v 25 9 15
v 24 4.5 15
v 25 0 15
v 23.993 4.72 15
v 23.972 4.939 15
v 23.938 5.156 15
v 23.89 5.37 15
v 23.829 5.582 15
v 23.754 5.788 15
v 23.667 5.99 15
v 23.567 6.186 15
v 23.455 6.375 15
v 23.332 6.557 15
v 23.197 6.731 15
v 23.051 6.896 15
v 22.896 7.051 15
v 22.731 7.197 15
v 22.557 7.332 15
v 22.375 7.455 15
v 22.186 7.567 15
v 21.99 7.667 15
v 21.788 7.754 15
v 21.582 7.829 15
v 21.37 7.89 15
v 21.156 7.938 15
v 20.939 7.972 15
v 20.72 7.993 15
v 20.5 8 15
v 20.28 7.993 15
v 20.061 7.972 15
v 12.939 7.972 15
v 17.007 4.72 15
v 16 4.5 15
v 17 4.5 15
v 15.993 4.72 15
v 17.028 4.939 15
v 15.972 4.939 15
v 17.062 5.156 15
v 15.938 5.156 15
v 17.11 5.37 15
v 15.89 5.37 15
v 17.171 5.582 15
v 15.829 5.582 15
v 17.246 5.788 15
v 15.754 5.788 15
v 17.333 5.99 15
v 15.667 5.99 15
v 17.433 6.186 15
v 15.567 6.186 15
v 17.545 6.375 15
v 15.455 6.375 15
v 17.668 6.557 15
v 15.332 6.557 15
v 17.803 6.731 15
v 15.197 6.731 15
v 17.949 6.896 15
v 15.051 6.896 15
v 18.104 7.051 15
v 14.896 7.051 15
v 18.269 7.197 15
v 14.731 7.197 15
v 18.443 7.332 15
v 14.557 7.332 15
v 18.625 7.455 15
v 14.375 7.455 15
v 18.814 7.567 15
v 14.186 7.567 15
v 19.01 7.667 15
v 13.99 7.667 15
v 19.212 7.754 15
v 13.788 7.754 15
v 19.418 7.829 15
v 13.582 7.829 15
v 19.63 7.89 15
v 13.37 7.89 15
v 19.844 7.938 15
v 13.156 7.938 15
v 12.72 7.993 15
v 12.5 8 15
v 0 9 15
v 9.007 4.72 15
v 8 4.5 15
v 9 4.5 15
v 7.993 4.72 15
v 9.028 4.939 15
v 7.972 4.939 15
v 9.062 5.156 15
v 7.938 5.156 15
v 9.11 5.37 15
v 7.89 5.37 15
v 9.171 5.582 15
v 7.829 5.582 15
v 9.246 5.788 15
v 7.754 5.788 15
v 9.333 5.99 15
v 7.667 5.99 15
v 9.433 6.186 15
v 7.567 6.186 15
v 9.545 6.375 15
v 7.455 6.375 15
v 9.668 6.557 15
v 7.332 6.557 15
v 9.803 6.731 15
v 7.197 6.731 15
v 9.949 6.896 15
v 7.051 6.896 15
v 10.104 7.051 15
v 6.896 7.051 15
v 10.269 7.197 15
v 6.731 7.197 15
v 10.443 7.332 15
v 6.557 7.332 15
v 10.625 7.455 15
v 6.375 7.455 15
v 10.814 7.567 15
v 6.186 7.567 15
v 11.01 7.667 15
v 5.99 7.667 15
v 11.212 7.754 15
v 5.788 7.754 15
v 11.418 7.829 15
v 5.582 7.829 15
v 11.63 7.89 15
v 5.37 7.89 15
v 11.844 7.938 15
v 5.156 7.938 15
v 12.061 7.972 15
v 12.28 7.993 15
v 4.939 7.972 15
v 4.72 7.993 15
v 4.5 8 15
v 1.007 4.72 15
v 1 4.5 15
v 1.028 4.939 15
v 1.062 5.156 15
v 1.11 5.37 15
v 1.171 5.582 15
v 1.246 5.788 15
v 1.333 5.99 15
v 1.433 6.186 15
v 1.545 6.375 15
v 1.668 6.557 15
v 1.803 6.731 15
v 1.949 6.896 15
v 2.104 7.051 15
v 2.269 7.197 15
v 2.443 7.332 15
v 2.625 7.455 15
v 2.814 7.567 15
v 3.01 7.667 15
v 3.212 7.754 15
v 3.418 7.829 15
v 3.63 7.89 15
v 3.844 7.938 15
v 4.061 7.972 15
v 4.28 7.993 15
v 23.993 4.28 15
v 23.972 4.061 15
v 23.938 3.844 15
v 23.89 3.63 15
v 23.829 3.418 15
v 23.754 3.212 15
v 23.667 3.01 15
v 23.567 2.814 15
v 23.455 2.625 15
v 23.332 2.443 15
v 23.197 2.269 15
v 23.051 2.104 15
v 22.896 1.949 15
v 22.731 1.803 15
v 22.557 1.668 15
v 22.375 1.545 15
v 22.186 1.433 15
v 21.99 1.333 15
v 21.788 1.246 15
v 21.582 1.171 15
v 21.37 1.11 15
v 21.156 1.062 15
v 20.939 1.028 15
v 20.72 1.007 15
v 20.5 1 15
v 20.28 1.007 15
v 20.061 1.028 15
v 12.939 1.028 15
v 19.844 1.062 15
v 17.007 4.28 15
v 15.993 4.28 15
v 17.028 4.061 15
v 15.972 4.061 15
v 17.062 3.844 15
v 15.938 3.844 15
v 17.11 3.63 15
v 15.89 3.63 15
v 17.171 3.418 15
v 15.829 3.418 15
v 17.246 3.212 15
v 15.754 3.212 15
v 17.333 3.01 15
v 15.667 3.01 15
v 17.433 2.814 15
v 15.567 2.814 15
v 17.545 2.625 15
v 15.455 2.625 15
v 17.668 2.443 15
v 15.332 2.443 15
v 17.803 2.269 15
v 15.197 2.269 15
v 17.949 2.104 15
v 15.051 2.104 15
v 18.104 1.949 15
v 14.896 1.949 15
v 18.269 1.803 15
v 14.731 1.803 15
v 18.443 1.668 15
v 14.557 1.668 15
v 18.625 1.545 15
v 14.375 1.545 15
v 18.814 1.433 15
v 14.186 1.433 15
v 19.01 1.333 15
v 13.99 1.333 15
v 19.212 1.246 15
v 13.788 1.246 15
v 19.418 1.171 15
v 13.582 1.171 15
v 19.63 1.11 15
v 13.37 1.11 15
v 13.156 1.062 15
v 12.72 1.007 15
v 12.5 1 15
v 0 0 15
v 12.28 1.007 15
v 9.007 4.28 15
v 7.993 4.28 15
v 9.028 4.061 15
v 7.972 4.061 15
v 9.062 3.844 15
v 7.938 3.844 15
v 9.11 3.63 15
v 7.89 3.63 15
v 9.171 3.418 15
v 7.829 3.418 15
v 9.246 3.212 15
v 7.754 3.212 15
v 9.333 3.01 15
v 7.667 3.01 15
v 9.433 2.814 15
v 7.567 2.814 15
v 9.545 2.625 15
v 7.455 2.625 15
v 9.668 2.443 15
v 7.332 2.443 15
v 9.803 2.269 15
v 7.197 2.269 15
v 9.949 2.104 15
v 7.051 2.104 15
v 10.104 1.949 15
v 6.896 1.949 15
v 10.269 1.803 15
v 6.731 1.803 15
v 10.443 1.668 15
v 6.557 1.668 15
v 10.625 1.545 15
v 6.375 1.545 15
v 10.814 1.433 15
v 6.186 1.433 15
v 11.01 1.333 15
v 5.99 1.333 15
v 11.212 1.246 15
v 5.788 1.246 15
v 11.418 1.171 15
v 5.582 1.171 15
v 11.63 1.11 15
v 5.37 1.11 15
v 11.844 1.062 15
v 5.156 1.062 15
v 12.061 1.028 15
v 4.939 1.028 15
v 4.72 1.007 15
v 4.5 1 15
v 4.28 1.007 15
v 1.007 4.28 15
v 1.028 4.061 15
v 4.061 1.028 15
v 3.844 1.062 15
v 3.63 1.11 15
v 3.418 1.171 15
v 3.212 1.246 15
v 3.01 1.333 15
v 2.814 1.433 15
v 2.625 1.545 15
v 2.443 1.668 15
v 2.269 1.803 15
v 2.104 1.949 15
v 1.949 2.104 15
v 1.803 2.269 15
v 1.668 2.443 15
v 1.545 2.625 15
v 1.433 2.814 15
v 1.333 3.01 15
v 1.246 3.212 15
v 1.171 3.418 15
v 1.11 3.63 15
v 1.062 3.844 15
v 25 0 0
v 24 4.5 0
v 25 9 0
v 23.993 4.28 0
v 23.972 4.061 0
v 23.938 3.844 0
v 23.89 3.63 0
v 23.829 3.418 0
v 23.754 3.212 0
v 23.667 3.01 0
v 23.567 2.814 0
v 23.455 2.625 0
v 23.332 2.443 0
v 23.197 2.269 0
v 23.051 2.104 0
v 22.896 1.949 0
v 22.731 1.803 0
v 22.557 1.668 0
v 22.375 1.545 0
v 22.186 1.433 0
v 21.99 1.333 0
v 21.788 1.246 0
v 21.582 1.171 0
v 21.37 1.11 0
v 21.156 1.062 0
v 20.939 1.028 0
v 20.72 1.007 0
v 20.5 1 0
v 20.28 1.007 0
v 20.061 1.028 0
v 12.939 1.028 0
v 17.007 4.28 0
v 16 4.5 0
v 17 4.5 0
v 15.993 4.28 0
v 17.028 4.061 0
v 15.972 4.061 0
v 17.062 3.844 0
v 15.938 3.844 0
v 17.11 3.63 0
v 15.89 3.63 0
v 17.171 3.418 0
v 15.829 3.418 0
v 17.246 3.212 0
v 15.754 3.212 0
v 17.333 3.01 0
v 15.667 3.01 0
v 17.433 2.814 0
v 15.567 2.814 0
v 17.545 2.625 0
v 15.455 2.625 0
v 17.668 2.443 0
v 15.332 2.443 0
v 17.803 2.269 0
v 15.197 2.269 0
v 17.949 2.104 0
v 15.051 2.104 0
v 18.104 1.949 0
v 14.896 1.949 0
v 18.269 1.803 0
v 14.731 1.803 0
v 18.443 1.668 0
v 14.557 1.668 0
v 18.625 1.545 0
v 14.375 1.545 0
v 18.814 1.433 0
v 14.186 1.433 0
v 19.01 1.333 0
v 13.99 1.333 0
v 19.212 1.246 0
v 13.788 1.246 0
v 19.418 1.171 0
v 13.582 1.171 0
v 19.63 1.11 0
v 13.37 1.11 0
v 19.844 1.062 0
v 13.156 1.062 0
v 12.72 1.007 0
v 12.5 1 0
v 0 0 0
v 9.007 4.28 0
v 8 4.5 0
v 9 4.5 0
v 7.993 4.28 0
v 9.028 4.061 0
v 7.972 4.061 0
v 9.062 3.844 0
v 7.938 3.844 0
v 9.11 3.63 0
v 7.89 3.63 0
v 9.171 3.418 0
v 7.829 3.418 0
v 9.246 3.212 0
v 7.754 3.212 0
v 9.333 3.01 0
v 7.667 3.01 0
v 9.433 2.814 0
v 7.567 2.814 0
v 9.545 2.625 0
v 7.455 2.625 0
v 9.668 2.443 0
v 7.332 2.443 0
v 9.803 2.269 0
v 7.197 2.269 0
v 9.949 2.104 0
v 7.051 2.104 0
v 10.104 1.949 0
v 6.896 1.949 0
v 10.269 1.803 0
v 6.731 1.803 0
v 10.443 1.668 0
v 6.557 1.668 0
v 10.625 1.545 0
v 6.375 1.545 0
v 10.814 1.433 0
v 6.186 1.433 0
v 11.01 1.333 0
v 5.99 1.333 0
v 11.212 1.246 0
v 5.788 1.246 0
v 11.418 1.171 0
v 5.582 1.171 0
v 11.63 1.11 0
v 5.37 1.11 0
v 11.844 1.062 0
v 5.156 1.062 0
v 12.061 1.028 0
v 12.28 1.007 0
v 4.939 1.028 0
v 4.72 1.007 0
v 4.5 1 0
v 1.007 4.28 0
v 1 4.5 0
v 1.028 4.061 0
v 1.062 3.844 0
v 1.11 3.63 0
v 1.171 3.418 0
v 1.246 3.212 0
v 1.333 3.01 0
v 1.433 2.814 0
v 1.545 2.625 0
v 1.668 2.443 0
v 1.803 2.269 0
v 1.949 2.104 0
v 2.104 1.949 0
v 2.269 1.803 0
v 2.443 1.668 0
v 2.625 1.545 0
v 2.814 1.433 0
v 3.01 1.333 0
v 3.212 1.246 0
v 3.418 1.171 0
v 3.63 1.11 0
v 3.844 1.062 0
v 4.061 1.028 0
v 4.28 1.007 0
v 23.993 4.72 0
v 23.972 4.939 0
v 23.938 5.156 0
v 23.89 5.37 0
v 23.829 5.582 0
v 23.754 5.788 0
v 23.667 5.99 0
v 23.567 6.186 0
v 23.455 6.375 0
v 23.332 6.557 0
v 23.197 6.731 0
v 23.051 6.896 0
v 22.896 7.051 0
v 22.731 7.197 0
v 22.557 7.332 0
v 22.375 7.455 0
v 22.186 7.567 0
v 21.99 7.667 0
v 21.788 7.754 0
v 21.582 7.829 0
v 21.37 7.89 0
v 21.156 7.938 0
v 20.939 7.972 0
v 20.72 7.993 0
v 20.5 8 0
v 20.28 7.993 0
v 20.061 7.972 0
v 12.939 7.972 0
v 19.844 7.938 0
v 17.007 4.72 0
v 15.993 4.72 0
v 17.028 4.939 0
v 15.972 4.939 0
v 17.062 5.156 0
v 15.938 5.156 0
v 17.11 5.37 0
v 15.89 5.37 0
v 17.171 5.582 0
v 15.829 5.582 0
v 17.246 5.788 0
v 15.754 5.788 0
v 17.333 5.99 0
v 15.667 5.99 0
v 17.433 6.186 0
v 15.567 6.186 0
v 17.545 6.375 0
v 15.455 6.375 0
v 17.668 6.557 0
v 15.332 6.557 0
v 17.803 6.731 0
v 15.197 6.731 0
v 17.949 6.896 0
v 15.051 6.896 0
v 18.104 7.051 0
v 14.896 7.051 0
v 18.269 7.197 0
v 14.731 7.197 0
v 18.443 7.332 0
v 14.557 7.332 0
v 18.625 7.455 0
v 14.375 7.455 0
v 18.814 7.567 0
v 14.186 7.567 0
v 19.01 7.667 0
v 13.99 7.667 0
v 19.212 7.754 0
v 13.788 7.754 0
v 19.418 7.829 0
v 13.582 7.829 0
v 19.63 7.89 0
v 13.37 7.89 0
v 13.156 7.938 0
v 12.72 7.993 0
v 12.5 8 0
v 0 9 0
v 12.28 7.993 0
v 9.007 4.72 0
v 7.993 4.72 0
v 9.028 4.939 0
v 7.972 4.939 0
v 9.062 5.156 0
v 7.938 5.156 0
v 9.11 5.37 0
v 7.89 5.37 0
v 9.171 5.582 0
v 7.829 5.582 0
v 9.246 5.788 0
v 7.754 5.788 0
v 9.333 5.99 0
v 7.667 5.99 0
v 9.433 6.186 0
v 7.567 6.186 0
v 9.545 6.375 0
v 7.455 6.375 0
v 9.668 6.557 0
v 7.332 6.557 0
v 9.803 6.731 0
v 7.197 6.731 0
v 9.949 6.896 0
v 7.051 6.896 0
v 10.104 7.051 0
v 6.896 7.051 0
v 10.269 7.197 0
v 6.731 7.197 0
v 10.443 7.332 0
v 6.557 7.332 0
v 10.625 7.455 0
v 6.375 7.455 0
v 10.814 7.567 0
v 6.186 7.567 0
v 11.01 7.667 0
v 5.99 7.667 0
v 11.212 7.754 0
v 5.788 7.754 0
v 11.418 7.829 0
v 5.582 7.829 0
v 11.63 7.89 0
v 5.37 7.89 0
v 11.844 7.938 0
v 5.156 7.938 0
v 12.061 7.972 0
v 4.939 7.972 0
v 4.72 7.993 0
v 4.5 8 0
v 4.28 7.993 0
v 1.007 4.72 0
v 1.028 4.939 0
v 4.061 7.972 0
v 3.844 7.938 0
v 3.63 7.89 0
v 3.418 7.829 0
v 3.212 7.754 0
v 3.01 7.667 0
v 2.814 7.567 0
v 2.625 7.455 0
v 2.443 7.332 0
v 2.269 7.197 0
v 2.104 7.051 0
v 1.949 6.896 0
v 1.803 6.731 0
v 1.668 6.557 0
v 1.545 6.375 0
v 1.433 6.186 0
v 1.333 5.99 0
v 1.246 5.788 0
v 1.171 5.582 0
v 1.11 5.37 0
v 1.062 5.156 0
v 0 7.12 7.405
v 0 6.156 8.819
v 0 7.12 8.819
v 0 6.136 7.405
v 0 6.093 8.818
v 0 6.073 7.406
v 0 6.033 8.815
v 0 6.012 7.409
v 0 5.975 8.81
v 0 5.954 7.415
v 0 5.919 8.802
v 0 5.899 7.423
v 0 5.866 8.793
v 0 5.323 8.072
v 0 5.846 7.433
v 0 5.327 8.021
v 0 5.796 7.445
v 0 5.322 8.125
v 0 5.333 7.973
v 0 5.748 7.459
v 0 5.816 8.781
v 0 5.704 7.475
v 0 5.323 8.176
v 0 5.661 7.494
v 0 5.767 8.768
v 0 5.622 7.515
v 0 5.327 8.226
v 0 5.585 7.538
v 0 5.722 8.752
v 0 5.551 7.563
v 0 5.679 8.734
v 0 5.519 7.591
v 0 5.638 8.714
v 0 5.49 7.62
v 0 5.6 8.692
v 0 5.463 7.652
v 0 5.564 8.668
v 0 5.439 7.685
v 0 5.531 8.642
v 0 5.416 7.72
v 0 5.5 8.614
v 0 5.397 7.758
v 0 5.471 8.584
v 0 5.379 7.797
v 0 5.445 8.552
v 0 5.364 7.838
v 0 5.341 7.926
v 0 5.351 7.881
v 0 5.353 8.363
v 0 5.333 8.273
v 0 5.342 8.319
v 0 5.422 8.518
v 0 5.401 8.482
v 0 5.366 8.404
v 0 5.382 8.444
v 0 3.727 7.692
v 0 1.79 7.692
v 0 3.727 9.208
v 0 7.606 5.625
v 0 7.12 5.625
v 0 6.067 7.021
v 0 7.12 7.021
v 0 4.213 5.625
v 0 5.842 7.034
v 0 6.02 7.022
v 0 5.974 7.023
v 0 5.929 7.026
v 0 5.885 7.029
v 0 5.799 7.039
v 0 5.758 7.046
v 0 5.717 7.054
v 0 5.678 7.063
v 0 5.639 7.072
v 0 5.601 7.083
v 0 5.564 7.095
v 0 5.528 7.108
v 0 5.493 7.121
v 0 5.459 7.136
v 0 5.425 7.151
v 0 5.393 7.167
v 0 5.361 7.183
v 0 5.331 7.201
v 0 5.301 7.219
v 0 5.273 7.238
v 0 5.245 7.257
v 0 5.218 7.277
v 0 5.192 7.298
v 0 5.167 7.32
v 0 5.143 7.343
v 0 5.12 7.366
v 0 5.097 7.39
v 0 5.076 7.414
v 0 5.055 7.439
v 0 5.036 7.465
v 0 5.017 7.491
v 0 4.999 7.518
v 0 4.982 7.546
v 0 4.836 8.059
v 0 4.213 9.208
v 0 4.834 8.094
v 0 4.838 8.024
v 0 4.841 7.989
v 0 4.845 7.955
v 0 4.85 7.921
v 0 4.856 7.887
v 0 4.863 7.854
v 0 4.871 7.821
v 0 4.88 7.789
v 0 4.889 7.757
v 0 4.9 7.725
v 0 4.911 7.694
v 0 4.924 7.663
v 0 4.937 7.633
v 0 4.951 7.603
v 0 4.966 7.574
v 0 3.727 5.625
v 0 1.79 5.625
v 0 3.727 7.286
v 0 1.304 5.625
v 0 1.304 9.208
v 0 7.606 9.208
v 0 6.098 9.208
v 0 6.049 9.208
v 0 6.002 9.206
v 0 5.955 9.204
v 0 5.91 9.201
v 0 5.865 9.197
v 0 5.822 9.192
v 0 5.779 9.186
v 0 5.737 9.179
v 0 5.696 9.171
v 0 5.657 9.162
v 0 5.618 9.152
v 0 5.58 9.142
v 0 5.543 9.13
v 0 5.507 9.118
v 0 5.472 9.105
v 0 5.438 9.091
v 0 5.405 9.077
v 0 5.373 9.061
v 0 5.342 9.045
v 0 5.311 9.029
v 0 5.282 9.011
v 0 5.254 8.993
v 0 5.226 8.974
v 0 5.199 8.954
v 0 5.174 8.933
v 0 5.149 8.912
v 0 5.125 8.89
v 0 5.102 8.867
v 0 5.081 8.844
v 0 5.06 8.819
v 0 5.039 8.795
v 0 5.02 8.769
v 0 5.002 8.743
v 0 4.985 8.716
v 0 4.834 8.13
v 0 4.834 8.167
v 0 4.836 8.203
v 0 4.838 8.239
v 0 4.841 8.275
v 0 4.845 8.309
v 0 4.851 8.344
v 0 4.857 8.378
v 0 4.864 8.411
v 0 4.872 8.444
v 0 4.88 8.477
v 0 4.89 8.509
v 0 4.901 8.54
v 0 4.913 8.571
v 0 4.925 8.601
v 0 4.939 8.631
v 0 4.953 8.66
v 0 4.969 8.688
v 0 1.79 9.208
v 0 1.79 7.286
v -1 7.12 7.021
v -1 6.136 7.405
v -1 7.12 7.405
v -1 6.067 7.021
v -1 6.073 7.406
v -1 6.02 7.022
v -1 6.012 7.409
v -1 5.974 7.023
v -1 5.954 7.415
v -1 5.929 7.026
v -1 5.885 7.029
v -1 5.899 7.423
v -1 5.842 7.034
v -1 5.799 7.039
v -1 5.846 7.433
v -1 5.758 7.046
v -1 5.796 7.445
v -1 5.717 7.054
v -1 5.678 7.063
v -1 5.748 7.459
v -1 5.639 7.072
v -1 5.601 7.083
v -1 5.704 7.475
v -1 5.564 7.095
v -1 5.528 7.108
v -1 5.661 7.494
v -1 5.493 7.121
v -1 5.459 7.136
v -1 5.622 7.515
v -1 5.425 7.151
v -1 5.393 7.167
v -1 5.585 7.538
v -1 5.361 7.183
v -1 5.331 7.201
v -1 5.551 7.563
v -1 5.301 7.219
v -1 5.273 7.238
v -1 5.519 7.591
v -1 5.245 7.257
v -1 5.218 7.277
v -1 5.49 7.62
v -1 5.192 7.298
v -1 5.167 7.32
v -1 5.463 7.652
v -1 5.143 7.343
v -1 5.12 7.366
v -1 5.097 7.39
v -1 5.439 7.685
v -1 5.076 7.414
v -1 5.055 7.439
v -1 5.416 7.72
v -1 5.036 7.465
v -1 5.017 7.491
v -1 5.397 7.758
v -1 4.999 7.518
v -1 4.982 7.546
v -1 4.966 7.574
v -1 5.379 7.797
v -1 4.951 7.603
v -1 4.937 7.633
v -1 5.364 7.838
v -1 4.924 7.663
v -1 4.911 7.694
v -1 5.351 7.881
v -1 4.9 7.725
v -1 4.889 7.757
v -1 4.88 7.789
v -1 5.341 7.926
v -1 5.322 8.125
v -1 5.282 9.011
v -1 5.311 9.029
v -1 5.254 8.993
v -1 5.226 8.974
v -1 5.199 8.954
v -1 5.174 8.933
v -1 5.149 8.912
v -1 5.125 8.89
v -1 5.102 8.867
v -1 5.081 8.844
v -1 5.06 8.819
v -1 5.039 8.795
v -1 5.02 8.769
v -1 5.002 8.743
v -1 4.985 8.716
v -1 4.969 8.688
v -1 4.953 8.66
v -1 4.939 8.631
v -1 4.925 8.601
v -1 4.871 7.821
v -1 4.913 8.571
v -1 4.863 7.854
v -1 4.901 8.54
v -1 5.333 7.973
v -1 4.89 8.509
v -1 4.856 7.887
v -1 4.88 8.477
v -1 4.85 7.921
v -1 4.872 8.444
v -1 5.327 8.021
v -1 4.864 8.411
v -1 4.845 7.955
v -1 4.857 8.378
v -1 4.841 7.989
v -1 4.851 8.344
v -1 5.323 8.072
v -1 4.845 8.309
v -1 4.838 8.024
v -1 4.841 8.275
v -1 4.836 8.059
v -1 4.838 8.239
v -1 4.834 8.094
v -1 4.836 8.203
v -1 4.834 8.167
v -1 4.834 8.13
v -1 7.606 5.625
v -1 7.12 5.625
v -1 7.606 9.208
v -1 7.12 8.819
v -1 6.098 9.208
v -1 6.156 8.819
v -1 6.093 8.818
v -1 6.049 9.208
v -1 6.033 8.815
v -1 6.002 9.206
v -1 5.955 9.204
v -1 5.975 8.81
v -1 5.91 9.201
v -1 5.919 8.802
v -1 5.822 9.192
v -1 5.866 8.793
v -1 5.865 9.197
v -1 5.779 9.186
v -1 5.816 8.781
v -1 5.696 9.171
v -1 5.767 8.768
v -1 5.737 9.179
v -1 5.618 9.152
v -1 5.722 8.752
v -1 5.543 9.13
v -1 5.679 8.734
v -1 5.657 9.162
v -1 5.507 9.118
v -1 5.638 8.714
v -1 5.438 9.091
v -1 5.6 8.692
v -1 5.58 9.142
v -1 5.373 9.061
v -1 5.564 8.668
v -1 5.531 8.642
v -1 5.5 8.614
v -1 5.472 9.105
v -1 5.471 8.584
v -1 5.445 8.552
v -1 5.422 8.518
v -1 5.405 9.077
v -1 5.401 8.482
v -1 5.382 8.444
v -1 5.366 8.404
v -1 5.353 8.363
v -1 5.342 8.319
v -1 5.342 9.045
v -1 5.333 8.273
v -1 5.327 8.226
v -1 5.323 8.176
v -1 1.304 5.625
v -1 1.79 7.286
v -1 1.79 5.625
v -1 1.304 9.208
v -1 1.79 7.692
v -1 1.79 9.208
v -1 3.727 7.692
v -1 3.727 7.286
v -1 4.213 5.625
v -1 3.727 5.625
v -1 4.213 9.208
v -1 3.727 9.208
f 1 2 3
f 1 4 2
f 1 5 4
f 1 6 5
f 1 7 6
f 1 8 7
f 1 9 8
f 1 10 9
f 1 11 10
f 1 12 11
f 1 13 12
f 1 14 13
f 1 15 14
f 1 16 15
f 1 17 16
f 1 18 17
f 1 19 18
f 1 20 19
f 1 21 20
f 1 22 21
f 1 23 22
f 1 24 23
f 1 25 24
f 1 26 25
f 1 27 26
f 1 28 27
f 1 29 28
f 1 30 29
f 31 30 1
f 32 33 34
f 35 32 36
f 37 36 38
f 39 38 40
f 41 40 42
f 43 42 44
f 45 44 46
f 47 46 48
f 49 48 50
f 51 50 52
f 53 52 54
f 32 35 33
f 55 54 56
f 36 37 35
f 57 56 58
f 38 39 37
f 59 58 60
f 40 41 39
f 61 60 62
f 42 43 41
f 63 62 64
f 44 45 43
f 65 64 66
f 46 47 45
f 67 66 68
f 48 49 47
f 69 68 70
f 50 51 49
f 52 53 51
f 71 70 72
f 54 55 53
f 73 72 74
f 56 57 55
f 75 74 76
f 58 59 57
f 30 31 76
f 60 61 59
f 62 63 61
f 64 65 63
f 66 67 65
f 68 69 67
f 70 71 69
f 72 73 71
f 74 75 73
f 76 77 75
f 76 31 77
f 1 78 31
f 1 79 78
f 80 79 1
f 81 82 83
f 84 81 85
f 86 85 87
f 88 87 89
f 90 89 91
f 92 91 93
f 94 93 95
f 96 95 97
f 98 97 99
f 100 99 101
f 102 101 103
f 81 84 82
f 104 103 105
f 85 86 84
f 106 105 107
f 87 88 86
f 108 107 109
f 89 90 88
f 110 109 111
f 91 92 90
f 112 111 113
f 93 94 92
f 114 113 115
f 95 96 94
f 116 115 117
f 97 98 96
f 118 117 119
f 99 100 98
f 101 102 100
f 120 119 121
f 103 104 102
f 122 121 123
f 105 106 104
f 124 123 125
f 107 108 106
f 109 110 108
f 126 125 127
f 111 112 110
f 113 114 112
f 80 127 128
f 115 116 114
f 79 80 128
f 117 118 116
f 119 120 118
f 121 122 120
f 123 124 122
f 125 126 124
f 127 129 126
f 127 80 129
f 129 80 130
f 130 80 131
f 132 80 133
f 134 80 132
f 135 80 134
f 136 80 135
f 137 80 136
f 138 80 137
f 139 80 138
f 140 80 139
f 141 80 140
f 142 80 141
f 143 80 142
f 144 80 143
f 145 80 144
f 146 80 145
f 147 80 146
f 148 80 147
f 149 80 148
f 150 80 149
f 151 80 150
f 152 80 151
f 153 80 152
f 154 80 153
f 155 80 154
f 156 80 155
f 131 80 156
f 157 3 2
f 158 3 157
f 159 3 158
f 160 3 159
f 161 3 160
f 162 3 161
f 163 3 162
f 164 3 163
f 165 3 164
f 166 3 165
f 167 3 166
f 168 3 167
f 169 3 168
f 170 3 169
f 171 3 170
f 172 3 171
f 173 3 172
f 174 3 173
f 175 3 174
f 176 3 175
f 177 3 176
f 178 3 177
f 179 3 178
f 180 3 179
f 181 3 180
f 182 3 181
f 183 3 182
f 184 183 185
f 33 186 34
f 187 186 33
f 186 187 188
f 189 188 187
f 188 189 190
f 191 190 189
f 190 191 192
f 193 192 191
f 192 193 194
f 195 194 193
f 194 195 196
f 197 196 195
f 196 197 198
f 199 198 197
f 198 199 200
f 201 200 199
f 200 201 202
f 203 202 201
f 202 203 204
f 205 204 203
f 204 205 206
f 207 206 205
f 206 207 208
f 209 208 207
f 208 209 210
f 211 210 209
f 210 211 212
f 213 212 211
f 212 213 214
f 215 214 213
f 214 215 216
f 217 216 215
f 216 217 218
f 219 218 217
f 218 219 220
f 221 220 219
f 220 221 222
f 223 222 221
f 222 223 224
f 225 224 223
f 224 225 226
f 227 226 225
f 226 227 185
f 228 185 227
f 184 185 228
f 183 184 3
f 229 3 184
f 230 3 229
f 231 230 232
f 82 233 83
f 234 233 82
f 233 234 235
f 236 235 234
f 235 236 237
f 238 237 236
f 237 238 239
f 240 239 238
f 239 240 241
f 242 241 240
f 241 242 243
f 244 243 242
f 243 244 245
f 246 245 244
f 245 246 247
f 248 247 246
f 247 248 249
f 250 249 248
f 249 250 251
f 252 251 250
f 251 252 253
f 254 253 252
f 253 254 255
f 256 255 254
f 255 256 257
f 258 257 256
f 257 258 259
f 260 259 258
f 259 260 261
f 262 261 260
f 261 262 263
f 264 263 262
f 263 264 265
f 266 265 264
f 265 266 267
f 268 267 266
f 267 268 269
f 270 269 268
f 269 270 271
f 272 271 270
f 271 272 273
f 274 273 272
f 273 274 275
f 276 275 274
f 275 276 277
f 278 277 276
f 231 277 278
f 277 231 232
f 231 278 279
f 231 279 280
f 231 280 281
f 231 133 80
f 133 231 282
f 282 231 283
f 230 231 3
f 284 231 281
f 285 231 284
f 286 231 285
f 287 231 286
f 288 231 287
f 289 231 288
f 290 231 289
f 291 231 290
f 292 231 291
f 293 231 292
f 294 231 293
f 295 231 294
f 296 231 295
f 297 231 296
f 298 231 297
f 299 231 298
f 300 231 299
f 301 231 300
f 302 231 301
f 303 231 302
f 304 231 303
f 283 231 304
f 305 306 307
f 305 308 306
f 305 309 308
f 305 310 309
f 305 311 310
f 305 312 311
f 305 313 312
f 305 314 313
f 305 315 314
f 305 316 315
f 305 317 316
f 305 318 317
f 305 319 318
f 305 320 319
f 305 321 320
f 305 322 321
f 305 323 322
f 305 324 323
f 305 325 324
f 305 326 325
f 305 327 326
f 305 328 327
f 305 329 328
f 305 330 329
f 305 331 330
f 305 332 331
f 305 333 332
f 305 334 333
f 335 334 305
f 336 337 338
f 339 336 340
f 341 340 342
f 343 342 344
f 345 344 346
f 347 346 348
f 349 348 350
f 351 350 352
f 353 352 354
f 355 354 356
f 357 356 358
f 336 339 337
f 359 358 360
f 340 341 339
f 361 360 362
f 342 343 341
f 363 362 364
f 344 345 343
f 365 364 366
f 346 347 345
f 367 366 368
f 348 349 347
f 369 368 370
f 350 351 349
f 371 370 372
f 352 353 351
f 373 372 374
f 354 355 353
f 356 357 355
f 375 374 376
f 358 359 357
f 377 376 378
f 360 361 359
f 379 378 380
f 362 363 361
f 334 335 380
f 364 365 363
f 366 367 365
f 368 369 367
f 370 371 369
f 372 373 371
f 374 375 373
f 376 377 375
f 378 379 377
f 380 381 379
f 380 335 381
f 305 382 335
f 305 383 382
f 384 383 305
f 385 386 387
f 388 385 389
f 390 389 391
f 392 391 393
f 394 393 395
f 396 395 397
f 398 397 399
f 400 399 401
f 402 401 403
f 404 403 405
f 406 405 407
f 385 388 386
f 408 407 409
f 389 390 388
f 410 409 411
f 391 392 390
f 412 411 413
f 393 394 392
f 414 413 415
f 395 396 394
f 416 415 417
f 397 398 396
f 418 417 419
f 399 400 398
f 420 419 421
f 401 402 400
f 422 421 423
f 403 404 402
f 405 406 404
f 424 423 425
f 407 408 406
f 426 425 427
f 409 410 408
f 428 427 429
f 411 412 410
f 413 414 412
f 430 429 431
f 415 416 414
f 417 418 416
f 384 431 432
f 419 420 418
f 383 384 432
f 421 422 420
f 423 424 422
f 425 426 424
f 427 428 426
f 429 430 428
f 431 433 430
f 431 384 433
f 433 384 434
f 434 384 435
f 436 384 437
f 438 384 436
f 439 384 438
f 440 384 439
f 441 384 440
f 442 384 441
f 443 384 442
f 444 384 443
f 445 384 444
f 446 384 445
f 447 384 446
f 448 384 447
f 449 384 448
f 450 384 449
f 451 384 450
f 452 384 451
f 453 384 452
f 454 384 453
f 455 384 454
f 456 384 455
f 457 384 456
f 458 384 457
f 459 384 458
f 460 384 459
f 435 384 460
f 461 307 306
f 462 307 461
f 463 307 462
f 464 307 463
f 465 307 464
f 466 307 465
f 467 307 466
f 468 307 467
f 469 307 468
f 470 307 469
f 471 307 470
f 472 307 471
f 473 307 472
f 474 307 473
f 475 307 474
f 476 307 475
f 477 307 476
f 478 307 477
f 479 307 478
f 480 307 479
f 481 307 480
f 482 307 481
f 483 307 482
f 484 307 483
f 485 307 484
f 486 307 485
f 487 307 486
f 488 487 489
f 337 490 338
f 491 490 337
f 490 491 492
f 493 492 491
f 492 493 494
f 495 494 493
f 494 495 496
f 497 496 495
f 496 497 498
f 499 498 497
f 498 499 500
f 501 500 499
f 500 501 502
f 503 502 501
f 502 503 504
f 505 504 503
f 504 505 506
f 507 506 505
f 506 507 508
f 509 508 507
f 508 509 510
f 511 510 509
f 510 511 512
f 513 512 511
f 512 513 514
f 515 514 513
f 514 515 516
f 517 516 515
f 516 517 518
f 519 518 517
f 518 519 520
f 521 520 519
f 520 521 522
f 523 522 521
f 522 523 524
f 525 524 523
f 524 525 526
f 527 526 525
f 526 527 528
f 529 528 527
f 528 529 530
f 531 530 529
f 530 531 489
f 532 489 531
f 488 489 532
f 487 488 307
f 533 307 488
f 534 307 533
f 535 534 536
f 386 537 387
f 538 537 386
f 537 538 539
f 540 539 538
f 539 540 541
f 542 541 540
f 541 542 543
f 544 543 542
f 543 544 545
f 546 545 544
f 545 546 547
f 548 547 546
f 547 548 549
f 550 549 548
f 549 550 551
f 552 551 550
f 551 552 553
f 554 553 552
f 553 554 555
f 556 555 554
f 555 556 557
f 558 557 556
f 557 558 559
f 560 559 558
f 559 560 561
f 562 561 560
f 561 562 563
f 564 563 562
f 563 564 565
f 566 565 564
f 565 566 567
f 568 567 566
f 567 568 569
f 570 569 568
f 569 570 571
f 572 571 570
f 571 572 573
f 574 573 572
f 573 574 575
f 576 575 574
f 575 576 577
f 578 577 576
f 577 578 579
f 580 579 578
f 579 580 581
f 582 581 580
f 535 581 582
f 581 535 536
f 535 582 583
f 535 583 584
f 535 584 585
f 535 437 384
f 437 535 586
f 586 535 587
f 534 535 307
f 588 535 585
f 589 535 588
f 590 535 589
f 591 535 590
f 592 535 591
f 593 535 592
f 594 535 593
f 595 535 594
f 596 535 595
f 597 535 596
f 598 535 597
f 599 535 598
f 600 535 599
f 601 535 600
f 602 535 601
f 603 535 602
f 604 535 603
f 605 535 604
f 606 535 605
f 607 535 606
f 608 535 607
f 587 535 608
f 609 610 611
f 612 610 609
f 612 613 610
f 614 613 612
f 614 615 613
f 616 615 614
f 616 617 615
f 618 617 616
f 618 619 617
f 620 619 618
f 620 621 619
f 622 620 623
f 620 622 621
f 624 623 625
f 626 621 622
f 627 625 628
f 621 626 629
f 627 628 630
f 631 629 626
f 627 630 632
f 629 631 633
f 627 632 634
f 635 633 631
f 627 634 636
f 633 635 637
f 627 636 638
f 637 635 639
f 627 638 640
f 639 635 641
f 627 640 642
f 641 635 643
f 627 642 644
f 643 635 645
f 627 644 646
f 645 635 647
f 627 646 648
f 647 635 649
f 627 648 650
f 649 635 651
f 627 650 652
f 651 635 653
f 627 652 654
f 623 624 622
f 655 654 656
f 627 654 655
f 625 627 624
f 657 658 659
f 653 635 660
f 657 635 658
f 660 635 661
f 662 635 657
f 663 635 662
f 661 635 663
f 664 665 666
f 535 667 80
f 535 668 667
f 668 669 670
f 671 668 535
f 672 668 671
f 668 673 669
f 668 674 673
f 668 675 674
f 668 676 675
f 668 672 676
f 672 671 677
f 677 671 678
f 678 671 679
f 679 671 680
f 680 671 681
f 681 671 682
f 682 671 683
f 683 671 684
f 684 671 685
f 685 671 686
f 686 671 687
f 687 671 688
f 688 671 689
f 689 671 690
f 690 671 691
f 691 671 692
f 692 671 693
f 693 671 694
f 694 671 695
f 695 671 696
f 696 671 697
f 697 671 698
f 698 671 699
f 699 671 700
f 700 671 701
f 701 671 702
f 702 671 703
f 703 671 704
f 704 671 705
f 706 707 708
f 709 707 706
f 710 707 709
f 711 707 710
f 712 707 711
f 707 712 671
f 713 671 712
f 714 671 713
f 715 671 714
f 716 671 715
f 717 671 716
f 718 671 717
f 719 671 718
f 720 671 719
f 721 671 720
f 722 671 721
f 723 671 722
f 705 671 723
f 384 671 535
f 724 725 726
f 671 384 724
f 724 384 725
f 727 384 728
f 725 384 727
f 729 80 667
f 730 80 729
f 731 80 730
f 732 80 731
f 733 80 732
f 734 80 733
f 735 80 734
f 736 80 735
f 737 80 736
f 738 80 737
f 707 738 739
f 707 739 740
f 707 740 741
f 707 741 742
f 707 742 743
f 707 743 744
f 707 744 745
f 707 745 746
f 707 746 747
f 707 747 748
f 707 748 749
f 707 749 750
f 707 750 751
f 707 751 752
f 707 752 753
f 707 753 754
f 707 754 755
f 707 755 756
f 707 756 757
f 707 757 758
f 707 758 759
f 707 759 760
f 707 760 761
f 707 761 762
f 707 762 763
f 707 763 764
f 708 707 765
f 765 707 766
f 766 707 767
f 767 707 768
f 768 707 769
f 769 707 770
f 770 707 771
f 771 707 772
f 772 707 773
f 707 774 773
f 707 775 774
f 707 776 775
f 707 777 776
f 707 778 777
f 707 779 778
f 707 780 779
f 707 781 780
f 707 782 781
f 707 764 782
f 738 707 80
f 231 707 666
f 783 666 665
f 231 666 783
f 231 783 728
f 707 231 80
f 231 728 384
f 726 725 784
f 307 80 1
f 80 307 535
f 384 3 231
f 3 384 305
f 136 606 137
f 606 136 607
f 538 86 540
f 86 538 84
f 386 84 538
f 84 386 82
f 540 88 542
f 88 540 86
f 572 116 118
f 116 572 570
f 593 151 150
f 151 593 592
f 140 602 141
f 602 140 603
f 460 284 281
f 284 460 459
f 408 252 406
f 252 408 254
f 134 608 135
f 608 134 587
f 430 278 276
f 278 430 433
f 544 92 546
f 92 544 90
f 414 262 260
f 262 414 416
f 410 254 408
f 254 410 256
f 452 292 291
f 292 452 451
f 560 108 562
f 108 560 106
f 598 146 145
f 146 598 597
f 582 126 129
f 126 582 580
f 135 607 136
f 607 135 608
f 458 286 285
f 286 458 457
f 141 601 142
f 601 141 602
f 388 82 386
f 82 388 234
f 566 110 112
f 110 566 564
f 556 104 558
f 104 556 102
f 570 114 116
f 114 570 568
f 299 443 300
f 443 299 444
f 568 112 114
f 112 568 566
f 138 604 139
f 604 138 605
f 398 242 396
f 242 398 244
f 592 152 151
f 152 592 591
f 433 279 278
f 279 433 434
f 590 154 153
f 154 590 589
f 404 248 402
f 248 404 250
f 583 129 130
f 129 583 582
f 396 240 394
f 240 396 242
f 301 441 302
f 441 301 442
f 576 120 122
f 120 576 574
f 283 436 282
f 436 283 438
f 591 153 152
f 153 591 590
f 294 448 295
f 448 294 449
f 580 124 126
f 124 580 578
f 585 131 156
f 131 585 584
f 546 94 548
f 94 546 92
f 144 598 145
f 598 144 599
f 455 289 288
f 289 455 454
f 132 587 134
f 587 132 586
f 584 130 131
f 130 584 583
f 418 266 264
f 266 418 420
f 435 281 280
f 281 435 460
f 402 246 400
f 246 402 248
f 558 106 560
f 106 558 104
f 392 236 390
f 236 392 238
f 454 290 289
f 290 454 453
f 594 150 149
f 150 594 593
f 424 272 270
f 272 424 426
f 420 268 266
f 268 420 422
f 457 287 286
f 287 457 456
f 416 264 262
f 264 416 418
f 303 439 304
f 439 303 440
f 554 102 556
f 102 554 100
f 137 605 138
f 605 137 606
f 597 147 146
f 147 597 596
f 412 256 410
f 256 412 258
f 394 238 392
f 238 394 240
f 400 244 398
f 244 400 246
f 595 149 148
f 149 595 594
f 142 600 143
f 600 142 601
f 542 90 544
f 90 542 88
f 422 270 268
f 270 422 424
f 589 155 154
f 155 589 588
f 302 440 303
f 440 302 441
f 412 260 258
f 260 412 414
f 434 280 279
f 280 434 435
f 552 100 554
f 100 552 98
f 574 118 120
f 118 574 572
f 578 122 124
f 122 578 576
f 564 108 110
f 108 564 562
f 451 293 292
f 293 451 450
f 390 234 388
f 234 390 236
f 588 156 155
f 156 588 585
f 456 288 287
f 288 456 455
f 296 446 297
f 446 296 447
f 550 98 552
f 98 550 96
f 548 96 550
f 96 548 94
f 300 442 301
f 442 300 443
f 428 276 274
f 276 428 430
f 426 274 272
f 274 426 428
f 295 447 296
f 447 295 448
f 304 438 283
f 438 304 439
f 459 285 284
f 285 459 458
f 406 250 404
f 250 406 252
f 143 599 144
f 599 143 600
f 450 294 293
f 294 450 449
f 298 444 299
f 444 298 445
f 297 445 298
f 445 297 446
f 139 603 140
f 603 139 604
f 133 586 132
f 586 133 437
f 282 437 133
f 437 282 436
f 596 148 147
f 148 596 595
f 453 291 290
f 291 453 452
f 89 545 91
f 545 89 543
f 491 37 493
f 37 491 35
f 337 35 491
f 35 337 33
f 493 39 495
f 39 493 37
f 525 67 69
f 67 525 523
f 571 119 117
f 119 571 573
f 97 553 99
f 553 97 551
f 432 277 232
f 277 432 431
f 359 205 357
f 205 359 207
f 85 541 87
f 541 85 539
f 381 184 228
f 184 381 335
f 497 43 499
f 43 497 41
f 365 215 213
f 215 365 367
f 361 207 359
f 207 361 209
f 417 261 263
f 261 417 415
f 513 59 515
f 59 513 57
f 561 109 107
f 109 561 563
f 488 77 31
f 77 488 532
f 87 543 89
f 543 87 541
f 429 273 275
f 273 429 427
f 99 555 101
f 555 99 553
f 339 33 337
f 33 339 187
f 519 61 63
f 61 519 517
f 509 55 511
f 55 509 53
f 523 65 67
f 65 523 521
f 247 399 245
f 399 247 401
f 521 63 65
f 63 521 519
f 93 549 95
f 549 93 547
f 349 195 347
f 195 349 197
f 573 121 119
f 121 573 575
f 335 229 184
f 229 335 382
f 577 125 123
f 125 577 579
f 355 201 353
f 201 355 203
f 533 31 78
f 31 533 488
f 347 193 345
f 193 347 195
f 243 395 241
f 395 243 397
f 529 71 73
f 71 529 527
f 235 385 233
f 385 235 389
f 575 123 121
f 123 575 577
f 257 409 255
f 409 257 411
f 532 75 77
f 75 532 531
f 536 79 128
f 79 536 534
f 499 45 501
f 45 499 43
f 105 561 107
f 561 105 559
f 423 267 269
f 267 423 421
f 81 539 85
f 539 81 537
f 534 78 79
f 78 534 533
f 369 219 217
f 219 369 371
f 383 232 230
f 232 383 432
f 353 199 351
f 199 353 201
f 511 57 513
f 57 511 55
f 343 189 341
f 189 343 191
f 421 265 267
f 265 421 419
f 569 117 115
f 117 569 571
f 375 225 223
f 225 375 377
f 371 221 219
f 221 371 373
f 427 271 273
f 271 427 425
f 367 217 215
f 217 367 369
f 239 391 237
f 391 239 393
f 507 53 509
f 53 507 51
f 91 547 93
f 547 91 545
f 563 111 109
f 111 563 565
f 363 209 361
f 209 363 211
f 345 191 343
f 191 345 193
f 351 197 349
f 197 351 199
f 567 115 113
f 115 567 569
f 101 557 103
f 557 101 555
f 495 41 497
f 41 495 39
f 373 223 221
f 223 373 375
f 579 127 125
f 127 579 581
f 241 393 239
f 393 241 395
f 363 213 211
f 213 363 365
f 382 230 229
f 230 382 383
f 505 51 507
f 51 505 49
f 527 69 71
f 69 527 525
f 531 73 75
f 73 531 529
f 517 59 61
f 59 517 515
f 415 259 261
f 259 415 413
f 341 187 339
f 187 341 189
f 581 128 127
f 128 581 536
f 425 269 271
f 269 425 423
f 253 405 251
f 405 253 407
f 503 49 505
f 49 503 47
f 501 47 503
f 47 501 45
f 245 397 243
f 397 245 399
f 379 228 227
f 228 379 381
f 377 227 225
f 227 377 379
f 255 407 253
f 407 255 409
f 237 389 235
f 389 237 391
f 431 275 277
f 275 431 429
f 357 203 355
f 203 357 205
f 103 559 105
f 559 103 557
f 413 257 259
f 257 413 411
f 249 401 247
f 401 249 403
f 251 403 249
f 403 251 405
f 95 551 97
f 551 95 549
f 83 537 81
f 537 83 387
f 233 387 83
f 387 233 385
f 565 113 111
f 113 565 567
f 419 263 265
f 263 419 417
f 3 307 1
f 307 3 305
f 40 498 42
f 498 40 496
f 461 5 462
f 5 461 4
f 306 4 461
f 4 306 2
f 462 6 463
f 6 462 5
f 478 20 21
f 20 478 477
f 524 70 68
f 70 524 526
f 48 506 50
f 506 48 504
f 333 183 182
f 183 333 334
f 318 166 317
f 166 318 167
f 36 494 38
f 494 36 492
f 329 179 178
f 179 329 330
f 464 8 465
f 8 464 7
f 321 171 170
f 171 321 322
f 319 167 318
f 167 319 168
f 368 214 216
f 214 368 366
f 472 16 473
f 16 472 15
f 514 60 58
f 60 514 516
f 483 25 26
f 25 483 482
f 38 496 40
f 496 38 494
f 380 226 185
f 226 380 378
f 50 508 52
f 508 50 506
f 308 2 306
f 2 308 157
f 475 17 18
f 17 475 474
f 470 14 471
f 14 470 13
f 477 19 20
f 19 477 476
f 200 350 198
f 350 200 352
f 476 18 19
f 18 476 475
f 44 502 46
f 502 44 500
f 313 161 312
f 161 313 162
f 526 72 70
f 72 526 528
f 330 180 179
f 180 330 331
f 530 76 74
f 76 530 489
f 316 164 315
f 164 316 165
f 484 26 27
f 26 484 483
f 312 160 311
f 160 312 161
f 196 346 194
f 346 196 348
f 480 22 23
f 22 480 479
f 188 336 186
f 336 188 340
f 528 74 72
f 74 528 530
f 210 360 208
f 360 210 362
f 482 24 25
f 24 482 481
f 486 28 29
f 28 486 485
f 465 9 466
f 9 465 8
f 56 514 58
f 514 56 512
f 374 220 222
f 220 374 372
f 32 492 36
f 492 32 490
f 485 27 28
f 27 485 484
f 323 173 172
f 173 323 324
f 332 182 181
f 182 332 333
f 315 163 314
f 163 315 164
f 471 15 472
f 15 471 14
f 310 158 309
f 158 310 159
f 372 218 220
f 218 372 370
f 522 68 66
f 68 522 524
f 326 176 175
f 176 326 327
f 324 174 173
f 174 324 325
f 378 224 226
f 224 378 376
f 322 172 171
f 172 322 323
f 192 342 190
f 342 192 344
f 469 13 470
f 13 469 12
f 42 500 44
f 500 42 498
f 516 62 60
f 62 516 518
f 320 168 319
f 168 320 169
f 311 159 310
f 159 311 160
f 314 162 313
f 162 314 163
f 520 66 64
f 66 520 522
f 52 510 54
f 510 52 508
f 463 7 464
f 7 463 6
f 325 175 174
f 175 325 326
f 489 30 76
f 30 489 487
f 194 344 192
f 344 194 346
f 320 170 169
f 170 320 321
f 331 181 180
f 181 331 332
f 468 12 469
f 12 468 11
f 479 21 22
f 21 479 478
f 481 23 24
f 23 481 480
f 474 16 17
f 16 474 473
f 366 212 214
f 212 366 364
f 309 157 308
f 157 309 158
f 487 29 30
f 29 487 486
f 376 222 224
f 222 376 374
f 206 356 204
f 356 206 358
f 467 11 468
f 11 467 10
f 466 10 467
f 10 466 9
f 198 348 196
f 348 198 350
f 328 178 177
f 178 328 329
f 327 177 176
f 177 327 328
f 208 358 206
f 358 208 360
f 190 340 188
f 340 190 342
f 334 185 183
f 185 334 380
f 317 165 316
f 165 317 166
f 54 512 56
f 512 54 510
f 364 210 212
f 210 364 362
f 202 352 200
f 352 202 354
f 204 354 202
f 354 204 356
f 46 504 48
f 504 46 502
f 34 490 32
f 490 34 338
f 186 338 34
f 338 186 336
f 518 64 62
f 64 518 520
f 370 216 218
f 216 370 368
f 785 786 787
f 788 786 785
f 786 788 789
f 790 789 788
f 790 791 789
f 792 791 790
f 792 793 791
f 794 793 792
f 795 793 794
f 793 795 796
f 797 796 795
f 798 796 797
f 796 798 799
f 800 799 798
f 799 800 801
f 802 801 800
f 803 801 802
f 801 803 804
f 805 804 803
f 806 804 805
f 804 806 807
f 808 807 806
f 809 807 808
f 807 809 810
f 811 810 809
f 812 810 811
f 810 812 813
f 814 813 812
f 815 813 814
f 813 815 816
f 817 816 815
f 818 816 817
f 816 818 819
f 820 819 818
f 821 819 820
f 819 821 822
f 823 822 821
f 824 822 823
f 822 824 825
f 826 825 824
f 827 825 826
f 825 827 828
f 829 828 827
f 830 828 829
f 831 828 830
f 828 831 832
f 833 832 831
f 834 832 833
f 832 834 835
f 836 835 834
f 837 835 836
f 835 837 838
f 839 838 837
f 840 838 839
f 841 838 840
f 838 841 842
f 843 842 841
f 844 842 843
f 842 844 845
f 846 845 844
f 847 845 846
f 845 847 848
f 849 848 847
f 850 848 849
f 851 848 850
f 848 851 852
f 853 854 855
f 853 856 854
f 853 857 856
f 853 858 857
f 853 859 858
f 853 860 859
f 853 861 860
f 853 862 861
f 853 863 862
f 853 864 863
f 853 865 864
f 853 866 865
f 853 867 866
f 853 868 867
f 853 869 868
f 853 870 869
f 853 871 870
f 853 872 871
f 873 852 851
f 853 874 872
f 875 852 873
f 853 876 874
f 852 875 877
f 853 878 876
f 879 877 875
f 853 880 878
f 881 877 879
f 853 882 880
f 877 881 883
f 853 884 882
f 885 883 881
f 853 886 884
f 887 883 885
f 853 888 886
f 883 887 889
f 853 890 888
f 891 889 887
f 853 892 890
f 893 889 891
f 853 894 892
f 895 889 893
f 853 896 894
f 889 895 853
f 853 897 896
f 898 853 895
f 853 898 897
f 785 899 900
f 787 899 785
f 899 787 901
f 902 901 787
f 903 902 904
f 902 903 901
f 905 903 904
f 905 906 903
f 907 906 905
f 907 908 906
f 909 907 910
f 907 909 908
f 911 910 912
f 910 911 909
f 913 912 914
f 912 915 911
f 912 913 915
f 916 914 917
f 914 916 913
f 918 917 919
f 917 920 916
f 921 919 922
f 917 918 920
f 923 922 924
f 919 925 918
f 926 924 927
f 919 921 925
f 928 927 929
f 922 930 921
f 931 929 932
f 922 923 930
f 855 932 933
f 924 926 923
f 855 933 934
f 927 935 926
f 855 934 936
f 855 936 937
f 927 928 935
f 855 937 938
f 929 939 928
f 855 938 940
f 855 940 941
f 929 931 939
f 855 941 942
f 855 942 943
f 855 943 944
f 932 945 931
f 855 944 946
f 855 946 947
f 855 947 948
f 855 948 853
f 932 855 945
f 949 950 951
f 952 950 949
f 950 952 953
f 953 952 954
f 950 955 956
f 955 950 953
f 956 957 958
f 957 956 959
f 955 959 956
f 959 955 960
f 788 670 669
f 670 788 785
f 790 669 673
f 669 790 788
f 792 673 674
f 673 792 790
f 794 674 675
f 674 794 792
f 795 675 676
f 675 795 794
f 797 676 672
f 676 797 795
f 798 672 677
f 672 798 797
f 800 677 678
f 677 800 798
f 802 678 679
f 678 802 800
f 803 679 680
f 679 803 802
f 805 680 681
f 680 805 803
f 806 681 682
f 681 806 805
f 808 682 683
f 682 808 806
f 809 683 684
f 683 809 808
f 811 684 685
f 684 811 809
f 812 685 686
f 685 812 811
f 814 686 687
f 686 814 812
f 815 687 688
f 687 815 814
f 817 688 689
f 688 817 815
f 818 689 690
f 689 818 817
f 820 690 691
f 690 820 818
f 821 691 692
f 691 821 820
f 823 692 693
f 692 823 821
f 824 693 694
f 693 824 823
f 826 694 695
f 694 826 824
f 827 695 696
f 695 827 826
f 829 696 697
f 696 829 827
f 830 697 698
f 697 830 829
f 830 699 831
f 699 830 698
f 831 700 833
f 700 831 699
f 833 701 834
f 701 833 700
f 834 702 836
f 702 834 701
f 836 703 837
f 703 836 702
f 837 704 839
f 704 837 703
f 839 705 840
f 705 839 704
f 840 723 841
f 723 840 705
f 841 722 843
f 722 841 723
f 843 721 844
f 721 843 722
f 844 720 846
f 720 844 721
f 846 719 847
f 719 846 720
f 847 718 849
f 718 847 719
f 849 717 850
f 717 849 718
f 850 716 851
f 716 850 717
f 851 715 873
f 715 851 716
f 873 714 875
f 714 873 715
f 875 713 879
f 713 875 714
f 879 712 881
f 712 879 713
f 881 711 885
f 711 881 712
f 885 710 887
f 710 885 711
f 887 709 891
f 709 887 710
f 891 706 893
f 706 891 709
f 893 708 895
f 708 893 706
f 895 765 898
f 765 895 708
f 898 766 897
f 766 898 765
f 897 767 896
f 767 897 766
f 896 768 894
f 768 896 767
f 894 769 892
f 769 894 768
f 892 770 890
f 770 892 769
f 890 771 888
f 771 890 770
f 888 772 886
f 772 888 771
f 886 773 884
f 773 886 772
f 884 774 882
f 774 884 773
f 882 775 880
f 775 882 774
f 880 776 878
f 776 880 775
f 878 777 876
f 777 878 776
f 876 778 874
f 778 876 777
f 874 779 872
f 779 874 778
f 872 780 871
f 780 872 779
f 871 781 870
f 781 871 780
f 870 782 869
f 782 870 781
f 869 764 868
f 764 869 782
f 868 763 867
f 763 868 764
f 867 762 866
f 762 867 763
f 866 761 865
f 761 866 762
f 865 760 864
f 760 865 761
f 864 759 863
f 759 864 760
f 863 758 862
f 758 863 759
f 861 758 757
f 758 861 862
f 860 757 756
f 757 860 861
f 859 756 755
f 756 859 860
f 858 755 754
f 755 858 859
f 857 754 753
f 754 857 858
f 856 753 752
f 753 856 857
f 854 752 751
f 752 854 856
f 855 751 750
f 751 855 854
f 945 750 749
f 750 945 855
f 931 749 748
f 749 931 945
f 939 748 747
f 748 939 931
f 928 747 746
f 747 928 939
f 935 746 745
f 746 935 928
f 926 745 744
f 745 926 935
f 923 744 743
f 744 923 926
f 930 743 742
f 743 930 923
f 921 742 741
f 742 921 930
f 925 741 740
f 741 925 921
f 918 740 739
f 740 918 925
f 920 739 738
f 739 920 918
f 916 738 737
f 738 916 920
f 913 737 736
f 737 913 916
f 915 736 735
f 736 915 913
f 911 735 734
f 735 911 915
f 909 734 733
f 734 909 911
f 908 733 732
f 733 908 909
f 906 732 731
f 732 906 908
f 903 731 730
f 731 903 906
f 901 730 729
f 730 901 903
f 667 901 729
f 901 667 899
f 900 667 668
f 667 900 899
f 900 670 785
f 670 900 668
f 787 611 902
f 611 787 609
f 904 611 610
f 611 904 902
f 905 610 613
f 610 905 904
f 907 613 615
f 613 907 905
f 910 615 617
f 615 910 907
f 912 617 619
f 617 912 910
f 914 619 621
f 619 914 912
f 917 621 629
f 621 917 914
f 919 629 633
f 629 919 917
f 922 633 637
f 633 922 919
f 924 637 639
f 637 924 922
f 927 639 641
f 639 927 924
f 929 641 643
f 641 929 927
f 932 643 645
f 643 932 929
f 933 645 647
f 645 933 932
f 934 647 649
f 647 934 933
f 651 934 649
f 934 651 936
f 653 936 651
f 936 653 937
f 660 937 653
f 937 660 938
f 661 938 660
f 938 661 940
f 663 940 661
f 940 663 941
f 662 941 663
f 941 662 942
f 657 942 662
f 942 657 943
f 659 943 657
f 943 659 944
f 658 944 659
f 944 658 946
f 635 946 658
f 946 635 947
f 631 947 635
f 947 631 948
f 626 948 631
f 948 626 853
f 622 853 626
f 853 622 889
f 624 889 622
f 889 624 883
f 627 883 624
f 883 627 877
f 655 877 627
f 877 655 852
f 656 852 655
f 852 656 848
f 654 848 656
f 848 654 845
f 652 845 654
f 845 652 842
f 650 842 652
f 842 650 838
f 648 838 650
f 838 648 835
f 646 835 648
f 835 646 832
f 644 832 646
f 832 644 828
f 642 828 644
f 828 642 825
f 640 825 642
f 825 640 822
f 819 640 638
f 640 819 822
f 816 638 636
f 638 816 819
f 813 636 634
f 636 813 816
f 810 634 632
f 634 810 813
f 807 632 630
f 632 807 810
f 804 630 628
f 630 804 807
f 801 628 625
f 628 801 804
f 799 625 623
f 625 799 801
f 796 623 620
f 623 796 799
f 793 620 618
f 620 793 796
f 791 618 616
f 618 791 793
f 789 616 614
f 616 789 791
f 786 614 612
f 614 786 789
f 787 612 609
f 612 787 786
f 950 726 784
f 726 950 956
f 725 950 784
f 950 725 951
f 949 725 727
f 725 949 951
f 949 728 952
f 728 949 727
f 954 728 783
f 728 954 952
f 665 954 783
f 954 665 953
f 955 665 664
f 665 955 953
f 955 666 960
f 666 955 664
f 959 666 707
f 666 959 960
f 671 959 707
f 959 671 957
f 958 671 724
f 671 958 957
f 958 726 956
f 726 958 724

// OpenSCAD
// ********************* PARAMETERS *********************
// - note: all sizes are in mm
BIT_RADIUS = 7; // radius of a single bit
BIT_SPACING = 1; // spacing between two bits
BOX_HEIGHT = 15; // height of the organizer
BITS_PER_LINE = 5; // number of bits per single line
LINES_PER_BOX = 5; // number of lines
FONT="Arial";
$fn = 100;
// ********************* HELPER CONSTANTS *********************
// ********************* MAIN *********************
bit_line(3, BIT_RADIUS, BIT_SPACING, BOX_HEIGHT);


// ********************* MODULES *********************
module bit_line(
    bit_count,
    bit_radius,
    bit_spacing,
    box_height
) {
    x_increment = bit_radius + bit_spacing;
    for (x_shift = [0: x_increment : x_increment * (bit_count - 1)]){
        translate([x_shift, 0, 0])
            single_bit_box(bit_radius, bit_spacing, box_height);
    }
    // title
    font_height = box_height / 4;
    translate([0, (bit_radius + 2 * bit_spacing) / 2, 3 * box_height / 8])
        rotate([90,0,-90])
            linear_extrude(1)
                text("PH", size = font_height, font = FONT, halign = "center", valign = "bottom", $fn = 100);
}

module single_bit_box(
    bit_radius,
    bit_spacing,
    box_height
) {
    difference(){
        x = bit_radius + 2 * bit_spacing;
        y = x;
        z = box_height;
        cube([x, y, z]);
        translate([x/2, y/2, -1])
            cylinder(h=box_height + 2,d=bit_radius);

    }
}
